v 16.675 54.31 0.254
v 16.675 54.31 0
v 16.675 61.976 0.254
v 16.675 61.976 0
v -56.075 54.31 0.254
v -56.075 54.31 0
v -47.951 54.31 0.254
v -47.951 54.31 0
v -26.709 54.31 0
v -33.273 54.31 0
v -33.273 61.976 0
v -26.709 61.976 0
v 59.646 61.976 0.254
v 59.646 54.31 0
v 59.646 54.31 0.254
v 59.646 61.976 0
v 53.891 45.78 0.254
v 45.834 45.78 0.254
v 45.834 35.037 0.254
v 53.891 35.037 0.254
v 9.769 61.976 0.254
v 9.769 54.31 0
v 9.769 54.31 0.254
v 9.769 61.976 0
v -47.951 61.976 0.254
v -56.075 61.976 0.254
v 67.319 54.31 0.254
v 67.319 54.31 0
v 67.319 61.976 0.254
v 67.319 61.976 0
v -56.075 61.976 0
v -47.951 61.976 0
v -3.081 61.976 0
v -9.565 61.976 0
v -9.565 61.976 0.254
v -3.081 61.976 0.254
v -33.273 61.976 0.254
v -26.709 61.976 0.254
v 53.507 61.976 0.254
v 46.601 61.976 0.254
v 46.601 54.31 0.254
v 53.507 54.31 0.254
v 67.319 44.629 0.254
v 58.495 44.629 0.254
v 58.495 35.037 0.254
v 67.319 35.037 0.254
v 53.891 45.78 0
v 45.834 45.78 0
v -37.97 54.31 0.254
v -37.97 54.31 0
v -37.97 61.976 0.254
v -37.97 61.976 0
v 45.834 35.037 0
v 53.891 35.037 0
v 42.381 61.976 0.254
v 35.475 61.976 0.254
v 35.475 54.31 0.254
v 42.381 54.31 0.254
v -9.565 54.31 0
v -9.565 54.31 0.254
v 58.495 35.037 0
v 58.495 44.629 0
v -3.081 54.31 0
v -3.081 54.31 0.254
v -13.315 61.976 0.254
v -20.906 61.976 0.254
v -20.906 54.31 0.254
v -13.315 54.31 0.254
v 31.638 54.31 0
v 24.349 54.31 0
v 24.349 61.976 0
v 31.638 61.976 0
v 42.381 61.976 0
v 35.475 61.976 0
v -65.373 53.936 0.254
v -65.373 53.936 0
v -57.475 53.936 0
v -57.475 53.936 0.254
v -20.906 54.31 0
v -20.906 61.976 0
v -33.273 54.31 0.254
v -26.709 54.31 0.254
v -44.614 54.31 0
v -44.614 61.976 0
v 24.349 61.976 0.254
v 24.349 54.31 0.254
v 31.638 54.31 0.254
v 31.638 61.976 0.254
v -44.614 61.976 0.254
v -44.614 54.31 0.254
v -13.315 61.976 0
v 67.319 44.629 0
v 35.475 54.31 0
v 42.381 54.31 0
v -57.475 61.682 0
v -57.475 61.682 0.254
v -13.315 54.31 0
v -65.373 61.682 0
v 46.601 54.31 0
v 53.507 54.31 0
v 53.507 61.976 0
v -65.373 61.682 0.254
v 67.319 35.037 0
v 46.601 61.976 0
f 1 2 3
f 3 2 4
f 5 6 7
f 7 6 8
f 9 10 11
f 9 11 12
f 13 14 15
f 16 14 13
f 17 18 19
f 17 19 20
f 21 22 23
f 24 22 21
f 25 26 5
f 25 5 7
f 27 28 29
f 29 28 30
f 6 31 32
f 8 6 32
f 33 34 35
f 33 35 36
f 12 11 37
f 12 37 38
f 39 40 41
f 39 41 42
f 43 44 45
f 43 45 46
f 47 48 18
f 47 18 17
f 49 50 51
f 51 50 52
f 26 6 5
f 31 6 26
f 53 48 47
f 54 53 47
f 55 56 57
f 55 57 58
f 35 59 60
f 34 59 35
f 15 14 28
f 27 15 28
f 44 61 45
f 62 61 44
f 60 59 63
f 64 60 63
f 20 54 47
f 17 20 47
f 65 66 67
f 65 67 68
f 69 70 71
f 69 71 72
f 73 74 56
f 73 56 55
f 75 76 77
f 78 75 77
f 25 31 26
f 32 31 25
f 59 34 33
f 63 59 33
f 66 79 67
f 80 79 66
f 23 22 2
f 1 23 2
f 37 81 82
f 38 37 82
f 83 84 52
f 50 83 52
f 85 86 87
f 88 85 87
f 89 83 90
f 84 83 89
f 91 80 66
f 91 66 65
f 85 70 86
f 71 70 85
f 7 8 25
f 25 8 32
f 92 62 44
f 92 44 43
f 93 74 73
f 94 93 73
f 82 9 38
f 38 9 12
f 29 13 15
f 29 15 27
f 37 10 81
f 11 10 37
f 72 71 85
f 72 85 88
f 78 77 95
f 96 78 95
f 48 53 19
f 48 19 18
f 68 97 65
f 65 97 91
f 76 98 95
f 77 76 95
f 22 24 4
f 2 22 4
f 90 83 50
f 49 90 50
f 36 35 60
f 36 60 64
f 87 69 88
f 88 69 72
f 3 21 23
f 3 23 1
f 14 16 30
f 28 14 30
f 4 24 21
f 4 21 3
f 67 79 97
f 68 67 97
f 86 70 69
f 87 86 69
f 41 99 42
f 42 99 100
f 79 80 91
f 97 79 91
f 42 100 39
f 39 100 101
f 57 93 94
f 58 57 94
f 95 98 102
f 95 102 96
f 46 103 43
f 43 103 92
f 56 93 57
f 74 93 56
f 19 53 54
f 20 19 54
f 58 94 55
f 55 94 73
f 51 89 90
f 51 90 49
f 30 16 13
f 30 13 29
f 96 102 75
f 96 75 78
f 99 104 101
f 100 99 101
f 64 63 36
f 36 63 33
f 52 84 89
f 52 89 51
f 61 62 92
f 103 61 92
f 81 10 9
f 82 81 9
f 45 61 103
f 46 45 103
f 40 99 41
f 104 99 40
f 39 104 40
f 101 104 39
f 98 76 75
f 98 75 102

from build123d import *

# Parameters (mm, degrees)
F0_W     = 7.898539
F0_H     = 7.745967
F1_DEPTH = 0.254
F2_W     = 8.124254
F2_H     = 7.665709
F2_W_2   = 6.644231
F2_W_3   = 6.564021
F2_W_4   = 7.590809
F2_W_5   = 6.483817
F2_W_6   = 6.905935
F2_W_7   = 7.289597
F2_W_8   = 6.90595
F2_W_9   = 6.905936
F2_W_10  = 7.67326
F2_W_11  = 8.824244
F2_H_2   = 9.59158
F2_W_12  = 8.05692
F2_H_3   = 10.742568
F3_DEPTH = 0.254


with BuildPart() as f1:
    # F0 (on Top) → F1 (new body)
    with BuildSketch(Plane.XY):
        with Locations((-61.423794, 57.808909)):
            Rectangle(F0_W, F0_H)
    extrude(amount=F1_DEPTH)


with BuildPart() as f3:
    # F2 (on Top) → F3 (new body)
    with BuildSketch(Plane.XY):
        with Locations((-52.013062, 58.143086)):
            Rectangle(F2_W, F2_H)
        with Locations((-41.291961, 58.143086)):
            Rectangle(F2_W_2, F2_H)
        with Locations((-29.991257, 58.143086)):
            Rectangle(F2_W_3, F2_H)
        with Locations((-17.110273, 58.143086)):
            Rectangle(F2_W_4, F2_H)
        with Locations((-6.322965, 58.143086)):
            Rectangle(F2_W_5, F2_H)
        with Locations((13.222413, 58.143086)):
            Rectangle(F2_W_6, F2_H)
        with Locations((27.993443, 58.143086)):
            Rectangle(F2_W_7, F2_H)
        with Locations((38.927842, 58.143086)):
            Rectangle(F2_W_8, F2_H)
        with Locations((50.054081, 58.143086)):
            Rectangle(F2_W_9, F2_H)
        with Locations((63.482286, 58.143086)):
            Rectangle(F2_W_10, F2_H)
        with Locations((62.906794, 39.833151)):
            Rectangle(F2_W_11, F2_H_2)
        with Locations((49.862245, 40.408645)):
            Rectangle(F2_W_12, F2_H_3)
    extrude(amount=F3_DEPTH)


solid = Compound([f1.part, f3.part])
